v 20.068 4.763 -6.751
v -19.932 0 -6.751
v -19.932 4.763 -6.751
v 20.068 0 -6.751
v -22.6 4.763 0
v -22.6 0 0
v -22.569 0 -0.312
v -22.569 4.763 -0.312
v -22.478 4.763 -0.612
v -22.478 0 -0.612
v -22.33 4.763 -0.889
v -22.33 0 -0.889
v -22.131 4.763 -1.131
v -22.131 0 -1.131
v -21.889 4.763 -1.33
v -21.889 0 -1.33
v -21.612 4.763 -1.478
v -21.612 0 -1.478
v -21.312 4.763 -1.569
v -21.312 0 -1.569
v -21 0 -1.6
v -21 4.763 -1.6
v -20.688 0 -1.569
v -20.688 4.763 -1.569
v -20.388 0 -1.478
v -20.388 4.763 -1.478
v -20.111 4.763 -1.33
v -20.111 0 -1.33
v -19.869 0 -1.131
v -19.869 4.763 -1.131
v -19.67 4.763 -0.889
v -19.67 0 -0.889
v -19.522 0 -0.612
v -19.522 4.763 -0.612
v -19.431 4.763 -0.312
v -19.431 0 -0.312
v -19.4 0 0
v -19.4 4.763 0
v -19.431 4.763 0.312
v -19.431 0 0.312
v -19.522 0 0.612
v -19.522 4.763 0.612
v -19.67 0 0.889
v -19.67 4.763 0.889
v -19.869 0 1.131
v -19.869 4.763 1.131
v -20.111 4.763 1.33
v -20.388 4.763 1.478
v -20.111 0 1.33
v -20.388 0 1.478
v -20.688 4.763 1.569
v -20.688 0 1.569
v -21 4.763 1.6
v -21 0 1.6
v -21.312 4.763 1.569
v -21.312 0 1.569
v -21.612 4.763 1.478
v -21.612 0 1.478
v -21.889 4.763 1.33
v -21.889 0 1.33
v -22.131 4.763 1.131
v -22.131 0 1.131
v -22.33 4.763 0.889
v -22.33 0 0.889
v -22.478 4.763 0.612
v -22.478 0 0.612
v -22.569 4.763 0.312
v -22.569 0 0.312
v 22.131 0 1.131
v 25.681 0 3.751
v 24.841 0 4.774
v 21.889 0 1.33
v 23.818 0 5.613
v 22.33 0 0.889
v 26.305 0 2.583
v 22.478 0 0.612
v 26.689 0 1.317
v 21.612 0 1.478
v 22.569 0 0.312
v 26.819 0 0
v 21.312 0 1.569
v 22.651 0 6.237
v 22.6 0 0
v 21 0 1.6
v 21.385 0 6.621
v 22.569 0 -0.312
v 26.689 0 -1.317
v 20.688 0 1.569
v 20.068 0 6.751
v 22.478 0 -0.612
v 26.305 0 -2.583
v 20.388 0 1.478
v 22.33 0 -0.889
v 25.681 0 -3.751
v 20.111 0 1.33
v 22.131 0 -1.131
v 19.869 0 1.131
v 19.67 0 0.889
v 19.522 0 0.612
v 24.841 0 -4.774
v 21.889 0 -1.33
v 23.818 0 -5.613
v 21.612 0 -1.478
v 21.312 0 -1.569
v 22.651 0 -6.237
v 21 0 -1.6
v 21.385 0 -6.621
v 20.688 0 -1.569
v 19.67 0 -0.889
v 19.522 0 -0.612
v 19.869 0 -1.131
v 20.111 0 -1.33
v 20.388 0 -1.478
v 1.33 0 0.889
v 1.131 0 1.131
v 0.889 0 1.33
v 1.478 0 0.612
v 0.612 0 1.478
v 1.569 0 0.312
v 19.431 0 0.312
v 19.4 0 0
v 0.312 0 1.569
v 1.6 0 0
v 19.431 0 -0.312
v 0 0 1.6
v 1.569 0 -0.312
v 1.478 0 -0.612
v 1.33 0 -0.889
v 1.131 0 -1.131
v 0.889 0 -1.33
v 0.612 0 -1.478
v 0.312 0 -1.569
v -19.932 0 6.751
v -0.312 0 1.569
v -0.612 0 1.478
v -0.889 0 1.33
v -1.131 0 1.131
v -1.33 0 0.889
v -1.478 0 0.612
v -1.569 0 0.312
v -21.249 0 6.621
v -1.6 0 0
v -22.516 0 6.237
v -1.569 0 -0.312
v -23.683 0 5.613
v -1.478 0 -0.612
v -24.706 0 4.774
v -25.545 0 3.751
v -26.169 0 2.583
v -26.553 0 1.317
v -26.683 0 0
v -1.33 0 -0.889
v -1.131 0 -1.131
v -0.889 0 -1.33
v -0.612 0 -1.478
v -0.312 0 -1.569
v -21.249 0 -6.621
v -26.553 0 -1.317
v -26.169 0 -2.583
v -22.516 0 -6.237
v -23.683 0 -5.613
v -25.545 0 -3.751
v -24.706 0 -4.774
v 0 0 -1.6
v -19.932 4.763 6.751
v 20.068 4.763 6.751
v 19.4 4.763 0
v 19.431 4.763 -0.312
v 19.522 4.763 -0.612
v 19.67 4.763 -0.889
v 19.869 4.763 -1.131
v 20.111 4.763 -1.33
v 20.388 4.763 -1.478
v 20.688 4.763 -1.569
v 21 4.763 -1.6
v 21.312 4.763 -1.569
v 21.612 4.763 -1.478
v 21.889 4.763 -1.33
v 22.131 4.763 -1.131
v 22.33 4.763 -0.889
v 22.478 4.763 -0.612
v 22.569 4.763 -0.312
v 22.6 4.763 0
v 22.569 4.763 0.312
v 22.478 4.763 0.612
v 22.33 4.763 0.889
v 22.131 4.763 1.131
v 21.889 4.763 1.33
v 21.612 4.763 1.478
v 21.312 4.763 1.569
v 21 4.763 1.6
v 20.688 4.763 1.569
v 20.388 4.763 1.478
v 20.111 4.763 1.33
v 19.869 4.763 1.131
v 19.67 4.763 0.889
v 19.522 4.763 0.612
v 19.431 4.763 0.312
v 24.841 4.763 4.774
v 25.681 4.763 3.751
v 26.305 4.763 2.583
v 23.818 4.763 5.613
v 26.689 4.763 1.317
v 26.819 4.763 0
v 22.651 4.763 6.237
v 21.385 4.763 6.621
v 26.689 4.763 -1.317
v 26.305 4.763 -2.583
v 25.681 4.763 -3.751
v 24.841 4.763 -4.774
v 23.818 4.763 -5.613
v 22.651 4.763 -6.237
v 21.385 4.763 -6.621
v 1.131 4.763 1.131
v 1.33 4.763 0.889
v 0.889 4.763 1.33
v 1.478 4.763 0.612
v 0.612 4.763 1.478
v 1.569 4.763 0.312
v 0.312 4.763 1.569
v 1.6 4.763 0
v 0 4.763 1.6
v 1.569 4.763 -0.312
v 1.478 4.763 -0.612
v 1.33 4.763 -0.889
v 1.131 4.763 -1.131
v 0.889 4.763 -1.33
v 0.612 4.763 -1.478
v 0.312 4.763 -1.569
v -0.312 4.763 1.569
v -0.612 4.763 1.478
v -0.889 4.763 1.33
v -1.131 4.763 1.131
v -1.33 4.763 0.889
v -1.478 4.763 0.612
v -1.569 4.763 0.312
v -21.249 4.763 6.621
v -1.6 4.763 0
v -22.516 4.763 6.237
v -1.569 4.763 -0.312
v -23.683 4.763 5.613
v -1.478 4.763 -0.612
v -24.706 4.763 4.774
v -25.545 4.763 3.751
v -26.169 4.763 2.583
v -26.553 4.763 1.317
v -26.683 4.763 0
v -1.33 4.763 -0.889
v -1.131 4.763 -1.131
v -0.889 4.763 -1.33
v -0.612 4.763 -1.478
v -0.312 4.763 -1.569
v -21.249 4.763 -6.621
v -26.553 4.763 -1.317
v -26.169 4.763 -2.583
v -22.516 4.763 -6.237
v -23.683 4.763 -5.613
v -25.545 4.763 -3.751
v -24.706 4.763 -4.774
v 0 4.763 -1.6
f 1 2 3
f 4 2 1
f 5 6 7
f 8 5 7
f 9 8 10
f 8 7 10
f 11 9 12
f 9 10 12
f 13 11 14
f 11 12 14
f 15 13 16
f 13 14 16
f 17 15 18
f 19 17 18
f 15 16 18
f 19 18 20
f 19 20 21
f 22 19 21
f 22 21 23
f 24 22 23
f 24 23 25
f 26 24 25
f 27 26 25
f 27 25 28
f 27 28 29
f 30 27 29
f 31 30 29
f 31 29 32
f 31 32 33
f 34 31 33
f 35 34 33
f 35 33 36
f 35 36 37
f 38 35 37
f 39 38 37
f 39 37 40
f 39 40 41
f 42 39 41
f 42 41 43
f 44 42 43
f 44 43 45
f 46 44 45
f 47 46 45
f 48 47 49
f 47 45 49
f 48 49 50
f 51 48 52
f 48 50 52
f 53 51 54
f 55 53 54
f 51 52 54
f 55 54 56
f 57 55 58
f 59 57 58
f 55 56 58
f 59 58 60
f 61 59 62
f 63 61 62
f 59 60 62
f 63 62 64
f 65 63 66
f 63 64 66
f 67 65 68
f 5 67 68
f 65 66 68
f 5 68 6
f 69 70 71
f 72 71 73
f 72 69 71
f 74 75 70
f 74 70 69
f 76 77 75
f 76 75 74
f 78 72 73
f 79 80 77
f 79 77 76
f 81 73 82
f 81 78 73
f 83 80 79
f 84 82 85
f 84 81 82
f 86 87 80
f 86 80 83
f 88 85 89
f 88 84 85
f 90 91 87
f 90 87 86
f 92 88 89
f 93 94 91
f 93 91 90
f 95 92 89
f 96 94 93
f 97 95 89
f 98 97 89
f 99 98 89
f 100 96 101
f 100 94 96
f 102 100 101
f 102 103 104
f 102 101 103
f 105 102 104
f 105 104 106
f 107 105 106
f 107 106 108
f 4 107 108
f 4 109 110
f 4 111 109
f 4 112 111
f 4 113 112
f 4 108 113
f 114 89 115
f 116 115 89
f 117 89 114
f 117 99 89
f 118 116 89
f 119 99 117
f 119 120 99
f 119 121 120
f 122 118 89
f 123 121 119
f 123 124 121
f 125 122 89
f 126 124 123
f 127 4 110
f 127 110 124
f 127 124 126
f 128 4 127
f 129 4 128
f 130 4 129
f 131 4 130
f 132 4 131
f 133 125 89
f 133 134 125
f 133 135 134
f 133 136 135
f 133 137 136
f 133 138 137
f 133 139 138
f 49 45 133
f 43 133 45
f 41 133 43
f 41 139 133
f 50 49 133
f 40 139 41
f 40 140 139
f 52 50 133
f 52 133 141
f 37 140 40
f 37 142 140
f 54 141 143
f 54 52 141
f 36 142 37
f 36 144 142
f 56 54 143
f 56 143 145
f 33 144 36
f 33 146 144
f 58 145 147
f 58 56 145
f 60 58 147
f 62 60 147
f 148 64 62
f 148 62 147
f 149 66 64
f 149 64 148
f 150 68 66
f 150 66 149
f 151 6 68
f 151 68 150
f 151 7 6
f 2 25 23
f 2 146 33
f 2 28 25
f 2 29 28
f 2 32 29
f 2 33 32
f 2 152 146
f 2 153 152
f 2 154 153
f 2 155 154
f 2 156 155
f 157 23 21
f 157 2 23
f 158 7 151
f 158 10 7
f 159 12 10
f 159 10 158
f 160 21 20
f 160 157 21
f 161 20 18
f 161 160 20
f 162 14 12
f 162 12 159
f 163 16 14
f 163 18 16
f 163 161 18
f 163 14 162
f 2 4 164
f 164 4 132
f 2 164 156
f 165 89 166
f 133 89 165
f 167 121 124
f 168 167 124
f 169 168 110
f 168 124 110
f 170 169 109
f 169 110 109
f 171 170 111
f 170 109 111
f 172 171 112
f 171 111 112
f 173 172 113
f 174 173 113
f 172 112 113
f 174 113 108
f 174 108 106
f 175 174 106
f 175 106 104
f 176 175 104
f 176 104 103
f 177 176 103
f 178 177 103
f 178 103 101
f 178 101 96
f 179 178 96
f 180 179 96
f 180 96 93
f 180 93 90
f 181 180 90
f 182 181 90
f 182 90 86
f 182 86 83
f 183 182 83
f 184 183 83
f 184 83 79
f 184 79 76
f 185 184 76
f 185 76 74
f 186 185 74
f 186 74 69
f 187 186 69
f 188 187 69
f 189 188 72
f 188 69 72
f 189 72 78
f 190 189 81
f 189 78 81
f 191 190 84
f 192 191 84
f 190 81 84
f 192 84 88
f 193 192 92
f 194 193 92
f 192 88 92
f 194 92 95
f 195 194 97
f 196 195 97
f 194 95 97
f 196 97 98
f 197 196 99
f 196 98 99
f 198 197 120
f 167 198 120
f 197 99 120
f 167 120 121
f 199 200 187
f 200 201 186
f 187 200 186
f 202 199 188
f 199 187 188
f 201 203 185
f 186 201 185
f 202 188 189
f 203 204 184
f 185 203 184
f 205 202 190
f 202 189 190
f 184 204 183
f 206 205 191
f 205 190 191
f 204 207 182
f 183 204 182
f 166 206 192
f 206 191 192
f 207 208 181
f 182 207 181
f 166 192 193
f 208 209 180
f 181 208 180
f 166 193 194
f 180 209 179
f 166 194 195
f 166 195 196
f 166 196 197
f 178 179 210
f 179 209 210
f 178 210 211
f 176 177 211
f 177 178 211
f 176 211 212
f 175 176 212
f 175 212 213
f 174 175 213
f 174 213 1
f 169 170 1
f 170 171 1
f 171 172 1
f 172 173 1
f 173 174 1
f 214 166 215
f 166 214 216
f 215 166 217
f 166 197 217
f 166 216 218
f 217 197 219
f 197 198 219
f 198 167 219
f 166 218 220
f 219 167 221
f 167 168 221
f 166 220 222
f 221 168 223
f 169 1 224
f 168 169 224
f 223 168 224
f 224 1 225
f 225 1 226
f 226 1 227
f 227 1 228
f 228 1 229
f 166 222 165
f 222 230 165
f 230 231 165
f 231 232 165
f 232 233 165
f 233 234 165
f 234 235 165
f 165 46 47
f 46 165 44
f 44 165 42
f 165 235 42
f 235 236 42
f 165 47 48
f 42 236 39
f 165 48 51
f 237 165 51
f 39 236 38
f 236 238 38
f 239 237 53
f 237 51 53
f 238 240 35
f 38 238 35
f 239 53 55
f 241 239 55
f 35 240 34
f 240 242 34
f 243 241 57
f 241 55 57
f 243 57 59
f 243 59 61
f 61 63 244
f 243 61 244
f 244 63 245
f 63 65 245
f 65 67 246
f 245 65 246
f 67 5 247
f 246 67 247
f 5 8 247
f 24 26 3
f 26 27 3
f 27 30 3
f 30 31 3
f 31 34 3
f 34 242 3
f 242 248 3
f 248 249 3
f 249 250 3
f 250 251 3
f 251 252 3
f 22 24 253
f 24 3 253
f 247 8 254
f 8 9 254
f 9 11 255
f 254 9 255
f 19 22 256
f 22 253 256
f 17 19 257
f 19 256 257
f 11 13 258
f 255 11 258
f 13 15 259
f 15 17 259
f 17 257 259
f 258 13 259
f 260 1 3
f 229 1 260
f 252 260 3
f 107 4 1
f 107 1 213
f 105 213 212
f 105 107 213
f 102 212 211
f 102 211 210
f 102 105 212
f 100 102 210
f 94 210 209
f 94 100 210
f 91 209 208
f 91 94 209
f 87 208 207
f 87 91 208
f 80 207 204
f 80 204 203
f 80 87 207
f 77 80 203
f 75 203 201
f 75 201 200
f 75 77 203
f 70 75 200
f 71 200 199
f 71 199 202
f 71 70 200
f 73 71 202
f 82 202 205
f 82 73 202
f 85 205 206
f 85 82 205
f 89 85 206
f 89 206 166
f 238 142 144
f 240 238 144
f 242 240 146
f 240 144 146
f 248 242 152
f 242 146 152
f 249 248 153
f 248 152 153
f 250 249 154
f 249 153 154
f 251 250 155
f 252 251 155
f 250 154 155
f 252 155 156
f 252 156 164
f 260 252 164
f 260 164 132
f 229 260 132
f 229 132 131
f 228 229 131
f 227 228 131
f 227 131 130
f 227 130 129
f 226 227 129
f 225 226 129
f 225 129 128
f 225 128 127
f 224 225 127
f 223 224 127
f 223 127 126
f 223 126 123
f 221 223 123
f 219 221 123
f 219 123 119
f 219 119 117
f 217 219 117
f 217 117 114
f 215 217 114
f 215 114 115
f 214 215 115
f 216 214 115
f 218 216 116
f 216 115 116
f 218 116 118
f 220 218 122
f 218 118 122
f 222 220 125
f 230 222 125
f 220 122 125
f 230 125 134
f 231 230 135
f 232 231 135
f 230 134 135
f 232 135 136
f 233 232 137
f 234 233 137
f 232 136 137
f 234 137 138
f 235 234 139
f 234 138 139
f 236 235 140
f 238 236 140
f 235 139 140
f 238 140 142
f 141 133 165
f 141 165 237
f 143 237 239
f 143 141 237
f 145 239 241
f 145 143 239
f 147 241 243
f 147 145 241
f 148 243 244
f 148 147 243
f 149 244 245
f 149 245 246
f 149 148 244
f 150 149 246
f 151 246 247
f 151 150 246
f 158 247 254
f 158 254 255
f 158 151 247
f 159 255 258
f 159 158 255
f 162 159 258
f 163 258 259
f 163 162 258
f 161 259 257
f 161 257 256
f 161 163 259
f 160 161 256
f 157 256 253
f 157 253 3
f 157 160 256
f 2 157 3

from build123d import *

# Parameters (mm, degrees)
BOSS_EXTRUDE1_DEPTH      = 4.763
M3_CLEARANCE_HOLE1_D     = 3.2
M3_CLEARANCE_HOLE1_DEPTH = 4.763


with BuildPart() as part:
    # Sketch1 → Boss-Extrude1 (new body)
    with BuildSketch(Plane(origin=(0, 0, 0), x_dir=(1, 0, 0), z_dir=(0, 1, 0))):
        with BuildLine():
            Line((-19.932225786, 6.750936854), (20.067774214, 6.750936854))
            ThreePointArc((20.067774214, 6.750936854), (26.818711069, 0), (20.067774214, -6.750936854))
            Line((20.067774214, -6.750936854), (-19.932225786, -6.750936854))
            ThreePointArc((-19.932225786, -6.750936854), (-26.68316264, 0), (-19.932225786, 6.750936854))
        make_face()
    extrude(amount=BOSS_EXTRUDE1_DEPTH)

    # M3 Clearance Hole1
    with Locations(Plane(origin=(0, 4.763, 0), x_dir=(1, 0, 0), z_dir=(0, 1, 0))):
        with Locations((-21, 0), (0, 0), (21, 0)):
            Hole(M3_CLEARANCE_HOLE1_D / 2, depth=M3_CLEARANCE_HOLE1_DEPTH)


solid = part.part
